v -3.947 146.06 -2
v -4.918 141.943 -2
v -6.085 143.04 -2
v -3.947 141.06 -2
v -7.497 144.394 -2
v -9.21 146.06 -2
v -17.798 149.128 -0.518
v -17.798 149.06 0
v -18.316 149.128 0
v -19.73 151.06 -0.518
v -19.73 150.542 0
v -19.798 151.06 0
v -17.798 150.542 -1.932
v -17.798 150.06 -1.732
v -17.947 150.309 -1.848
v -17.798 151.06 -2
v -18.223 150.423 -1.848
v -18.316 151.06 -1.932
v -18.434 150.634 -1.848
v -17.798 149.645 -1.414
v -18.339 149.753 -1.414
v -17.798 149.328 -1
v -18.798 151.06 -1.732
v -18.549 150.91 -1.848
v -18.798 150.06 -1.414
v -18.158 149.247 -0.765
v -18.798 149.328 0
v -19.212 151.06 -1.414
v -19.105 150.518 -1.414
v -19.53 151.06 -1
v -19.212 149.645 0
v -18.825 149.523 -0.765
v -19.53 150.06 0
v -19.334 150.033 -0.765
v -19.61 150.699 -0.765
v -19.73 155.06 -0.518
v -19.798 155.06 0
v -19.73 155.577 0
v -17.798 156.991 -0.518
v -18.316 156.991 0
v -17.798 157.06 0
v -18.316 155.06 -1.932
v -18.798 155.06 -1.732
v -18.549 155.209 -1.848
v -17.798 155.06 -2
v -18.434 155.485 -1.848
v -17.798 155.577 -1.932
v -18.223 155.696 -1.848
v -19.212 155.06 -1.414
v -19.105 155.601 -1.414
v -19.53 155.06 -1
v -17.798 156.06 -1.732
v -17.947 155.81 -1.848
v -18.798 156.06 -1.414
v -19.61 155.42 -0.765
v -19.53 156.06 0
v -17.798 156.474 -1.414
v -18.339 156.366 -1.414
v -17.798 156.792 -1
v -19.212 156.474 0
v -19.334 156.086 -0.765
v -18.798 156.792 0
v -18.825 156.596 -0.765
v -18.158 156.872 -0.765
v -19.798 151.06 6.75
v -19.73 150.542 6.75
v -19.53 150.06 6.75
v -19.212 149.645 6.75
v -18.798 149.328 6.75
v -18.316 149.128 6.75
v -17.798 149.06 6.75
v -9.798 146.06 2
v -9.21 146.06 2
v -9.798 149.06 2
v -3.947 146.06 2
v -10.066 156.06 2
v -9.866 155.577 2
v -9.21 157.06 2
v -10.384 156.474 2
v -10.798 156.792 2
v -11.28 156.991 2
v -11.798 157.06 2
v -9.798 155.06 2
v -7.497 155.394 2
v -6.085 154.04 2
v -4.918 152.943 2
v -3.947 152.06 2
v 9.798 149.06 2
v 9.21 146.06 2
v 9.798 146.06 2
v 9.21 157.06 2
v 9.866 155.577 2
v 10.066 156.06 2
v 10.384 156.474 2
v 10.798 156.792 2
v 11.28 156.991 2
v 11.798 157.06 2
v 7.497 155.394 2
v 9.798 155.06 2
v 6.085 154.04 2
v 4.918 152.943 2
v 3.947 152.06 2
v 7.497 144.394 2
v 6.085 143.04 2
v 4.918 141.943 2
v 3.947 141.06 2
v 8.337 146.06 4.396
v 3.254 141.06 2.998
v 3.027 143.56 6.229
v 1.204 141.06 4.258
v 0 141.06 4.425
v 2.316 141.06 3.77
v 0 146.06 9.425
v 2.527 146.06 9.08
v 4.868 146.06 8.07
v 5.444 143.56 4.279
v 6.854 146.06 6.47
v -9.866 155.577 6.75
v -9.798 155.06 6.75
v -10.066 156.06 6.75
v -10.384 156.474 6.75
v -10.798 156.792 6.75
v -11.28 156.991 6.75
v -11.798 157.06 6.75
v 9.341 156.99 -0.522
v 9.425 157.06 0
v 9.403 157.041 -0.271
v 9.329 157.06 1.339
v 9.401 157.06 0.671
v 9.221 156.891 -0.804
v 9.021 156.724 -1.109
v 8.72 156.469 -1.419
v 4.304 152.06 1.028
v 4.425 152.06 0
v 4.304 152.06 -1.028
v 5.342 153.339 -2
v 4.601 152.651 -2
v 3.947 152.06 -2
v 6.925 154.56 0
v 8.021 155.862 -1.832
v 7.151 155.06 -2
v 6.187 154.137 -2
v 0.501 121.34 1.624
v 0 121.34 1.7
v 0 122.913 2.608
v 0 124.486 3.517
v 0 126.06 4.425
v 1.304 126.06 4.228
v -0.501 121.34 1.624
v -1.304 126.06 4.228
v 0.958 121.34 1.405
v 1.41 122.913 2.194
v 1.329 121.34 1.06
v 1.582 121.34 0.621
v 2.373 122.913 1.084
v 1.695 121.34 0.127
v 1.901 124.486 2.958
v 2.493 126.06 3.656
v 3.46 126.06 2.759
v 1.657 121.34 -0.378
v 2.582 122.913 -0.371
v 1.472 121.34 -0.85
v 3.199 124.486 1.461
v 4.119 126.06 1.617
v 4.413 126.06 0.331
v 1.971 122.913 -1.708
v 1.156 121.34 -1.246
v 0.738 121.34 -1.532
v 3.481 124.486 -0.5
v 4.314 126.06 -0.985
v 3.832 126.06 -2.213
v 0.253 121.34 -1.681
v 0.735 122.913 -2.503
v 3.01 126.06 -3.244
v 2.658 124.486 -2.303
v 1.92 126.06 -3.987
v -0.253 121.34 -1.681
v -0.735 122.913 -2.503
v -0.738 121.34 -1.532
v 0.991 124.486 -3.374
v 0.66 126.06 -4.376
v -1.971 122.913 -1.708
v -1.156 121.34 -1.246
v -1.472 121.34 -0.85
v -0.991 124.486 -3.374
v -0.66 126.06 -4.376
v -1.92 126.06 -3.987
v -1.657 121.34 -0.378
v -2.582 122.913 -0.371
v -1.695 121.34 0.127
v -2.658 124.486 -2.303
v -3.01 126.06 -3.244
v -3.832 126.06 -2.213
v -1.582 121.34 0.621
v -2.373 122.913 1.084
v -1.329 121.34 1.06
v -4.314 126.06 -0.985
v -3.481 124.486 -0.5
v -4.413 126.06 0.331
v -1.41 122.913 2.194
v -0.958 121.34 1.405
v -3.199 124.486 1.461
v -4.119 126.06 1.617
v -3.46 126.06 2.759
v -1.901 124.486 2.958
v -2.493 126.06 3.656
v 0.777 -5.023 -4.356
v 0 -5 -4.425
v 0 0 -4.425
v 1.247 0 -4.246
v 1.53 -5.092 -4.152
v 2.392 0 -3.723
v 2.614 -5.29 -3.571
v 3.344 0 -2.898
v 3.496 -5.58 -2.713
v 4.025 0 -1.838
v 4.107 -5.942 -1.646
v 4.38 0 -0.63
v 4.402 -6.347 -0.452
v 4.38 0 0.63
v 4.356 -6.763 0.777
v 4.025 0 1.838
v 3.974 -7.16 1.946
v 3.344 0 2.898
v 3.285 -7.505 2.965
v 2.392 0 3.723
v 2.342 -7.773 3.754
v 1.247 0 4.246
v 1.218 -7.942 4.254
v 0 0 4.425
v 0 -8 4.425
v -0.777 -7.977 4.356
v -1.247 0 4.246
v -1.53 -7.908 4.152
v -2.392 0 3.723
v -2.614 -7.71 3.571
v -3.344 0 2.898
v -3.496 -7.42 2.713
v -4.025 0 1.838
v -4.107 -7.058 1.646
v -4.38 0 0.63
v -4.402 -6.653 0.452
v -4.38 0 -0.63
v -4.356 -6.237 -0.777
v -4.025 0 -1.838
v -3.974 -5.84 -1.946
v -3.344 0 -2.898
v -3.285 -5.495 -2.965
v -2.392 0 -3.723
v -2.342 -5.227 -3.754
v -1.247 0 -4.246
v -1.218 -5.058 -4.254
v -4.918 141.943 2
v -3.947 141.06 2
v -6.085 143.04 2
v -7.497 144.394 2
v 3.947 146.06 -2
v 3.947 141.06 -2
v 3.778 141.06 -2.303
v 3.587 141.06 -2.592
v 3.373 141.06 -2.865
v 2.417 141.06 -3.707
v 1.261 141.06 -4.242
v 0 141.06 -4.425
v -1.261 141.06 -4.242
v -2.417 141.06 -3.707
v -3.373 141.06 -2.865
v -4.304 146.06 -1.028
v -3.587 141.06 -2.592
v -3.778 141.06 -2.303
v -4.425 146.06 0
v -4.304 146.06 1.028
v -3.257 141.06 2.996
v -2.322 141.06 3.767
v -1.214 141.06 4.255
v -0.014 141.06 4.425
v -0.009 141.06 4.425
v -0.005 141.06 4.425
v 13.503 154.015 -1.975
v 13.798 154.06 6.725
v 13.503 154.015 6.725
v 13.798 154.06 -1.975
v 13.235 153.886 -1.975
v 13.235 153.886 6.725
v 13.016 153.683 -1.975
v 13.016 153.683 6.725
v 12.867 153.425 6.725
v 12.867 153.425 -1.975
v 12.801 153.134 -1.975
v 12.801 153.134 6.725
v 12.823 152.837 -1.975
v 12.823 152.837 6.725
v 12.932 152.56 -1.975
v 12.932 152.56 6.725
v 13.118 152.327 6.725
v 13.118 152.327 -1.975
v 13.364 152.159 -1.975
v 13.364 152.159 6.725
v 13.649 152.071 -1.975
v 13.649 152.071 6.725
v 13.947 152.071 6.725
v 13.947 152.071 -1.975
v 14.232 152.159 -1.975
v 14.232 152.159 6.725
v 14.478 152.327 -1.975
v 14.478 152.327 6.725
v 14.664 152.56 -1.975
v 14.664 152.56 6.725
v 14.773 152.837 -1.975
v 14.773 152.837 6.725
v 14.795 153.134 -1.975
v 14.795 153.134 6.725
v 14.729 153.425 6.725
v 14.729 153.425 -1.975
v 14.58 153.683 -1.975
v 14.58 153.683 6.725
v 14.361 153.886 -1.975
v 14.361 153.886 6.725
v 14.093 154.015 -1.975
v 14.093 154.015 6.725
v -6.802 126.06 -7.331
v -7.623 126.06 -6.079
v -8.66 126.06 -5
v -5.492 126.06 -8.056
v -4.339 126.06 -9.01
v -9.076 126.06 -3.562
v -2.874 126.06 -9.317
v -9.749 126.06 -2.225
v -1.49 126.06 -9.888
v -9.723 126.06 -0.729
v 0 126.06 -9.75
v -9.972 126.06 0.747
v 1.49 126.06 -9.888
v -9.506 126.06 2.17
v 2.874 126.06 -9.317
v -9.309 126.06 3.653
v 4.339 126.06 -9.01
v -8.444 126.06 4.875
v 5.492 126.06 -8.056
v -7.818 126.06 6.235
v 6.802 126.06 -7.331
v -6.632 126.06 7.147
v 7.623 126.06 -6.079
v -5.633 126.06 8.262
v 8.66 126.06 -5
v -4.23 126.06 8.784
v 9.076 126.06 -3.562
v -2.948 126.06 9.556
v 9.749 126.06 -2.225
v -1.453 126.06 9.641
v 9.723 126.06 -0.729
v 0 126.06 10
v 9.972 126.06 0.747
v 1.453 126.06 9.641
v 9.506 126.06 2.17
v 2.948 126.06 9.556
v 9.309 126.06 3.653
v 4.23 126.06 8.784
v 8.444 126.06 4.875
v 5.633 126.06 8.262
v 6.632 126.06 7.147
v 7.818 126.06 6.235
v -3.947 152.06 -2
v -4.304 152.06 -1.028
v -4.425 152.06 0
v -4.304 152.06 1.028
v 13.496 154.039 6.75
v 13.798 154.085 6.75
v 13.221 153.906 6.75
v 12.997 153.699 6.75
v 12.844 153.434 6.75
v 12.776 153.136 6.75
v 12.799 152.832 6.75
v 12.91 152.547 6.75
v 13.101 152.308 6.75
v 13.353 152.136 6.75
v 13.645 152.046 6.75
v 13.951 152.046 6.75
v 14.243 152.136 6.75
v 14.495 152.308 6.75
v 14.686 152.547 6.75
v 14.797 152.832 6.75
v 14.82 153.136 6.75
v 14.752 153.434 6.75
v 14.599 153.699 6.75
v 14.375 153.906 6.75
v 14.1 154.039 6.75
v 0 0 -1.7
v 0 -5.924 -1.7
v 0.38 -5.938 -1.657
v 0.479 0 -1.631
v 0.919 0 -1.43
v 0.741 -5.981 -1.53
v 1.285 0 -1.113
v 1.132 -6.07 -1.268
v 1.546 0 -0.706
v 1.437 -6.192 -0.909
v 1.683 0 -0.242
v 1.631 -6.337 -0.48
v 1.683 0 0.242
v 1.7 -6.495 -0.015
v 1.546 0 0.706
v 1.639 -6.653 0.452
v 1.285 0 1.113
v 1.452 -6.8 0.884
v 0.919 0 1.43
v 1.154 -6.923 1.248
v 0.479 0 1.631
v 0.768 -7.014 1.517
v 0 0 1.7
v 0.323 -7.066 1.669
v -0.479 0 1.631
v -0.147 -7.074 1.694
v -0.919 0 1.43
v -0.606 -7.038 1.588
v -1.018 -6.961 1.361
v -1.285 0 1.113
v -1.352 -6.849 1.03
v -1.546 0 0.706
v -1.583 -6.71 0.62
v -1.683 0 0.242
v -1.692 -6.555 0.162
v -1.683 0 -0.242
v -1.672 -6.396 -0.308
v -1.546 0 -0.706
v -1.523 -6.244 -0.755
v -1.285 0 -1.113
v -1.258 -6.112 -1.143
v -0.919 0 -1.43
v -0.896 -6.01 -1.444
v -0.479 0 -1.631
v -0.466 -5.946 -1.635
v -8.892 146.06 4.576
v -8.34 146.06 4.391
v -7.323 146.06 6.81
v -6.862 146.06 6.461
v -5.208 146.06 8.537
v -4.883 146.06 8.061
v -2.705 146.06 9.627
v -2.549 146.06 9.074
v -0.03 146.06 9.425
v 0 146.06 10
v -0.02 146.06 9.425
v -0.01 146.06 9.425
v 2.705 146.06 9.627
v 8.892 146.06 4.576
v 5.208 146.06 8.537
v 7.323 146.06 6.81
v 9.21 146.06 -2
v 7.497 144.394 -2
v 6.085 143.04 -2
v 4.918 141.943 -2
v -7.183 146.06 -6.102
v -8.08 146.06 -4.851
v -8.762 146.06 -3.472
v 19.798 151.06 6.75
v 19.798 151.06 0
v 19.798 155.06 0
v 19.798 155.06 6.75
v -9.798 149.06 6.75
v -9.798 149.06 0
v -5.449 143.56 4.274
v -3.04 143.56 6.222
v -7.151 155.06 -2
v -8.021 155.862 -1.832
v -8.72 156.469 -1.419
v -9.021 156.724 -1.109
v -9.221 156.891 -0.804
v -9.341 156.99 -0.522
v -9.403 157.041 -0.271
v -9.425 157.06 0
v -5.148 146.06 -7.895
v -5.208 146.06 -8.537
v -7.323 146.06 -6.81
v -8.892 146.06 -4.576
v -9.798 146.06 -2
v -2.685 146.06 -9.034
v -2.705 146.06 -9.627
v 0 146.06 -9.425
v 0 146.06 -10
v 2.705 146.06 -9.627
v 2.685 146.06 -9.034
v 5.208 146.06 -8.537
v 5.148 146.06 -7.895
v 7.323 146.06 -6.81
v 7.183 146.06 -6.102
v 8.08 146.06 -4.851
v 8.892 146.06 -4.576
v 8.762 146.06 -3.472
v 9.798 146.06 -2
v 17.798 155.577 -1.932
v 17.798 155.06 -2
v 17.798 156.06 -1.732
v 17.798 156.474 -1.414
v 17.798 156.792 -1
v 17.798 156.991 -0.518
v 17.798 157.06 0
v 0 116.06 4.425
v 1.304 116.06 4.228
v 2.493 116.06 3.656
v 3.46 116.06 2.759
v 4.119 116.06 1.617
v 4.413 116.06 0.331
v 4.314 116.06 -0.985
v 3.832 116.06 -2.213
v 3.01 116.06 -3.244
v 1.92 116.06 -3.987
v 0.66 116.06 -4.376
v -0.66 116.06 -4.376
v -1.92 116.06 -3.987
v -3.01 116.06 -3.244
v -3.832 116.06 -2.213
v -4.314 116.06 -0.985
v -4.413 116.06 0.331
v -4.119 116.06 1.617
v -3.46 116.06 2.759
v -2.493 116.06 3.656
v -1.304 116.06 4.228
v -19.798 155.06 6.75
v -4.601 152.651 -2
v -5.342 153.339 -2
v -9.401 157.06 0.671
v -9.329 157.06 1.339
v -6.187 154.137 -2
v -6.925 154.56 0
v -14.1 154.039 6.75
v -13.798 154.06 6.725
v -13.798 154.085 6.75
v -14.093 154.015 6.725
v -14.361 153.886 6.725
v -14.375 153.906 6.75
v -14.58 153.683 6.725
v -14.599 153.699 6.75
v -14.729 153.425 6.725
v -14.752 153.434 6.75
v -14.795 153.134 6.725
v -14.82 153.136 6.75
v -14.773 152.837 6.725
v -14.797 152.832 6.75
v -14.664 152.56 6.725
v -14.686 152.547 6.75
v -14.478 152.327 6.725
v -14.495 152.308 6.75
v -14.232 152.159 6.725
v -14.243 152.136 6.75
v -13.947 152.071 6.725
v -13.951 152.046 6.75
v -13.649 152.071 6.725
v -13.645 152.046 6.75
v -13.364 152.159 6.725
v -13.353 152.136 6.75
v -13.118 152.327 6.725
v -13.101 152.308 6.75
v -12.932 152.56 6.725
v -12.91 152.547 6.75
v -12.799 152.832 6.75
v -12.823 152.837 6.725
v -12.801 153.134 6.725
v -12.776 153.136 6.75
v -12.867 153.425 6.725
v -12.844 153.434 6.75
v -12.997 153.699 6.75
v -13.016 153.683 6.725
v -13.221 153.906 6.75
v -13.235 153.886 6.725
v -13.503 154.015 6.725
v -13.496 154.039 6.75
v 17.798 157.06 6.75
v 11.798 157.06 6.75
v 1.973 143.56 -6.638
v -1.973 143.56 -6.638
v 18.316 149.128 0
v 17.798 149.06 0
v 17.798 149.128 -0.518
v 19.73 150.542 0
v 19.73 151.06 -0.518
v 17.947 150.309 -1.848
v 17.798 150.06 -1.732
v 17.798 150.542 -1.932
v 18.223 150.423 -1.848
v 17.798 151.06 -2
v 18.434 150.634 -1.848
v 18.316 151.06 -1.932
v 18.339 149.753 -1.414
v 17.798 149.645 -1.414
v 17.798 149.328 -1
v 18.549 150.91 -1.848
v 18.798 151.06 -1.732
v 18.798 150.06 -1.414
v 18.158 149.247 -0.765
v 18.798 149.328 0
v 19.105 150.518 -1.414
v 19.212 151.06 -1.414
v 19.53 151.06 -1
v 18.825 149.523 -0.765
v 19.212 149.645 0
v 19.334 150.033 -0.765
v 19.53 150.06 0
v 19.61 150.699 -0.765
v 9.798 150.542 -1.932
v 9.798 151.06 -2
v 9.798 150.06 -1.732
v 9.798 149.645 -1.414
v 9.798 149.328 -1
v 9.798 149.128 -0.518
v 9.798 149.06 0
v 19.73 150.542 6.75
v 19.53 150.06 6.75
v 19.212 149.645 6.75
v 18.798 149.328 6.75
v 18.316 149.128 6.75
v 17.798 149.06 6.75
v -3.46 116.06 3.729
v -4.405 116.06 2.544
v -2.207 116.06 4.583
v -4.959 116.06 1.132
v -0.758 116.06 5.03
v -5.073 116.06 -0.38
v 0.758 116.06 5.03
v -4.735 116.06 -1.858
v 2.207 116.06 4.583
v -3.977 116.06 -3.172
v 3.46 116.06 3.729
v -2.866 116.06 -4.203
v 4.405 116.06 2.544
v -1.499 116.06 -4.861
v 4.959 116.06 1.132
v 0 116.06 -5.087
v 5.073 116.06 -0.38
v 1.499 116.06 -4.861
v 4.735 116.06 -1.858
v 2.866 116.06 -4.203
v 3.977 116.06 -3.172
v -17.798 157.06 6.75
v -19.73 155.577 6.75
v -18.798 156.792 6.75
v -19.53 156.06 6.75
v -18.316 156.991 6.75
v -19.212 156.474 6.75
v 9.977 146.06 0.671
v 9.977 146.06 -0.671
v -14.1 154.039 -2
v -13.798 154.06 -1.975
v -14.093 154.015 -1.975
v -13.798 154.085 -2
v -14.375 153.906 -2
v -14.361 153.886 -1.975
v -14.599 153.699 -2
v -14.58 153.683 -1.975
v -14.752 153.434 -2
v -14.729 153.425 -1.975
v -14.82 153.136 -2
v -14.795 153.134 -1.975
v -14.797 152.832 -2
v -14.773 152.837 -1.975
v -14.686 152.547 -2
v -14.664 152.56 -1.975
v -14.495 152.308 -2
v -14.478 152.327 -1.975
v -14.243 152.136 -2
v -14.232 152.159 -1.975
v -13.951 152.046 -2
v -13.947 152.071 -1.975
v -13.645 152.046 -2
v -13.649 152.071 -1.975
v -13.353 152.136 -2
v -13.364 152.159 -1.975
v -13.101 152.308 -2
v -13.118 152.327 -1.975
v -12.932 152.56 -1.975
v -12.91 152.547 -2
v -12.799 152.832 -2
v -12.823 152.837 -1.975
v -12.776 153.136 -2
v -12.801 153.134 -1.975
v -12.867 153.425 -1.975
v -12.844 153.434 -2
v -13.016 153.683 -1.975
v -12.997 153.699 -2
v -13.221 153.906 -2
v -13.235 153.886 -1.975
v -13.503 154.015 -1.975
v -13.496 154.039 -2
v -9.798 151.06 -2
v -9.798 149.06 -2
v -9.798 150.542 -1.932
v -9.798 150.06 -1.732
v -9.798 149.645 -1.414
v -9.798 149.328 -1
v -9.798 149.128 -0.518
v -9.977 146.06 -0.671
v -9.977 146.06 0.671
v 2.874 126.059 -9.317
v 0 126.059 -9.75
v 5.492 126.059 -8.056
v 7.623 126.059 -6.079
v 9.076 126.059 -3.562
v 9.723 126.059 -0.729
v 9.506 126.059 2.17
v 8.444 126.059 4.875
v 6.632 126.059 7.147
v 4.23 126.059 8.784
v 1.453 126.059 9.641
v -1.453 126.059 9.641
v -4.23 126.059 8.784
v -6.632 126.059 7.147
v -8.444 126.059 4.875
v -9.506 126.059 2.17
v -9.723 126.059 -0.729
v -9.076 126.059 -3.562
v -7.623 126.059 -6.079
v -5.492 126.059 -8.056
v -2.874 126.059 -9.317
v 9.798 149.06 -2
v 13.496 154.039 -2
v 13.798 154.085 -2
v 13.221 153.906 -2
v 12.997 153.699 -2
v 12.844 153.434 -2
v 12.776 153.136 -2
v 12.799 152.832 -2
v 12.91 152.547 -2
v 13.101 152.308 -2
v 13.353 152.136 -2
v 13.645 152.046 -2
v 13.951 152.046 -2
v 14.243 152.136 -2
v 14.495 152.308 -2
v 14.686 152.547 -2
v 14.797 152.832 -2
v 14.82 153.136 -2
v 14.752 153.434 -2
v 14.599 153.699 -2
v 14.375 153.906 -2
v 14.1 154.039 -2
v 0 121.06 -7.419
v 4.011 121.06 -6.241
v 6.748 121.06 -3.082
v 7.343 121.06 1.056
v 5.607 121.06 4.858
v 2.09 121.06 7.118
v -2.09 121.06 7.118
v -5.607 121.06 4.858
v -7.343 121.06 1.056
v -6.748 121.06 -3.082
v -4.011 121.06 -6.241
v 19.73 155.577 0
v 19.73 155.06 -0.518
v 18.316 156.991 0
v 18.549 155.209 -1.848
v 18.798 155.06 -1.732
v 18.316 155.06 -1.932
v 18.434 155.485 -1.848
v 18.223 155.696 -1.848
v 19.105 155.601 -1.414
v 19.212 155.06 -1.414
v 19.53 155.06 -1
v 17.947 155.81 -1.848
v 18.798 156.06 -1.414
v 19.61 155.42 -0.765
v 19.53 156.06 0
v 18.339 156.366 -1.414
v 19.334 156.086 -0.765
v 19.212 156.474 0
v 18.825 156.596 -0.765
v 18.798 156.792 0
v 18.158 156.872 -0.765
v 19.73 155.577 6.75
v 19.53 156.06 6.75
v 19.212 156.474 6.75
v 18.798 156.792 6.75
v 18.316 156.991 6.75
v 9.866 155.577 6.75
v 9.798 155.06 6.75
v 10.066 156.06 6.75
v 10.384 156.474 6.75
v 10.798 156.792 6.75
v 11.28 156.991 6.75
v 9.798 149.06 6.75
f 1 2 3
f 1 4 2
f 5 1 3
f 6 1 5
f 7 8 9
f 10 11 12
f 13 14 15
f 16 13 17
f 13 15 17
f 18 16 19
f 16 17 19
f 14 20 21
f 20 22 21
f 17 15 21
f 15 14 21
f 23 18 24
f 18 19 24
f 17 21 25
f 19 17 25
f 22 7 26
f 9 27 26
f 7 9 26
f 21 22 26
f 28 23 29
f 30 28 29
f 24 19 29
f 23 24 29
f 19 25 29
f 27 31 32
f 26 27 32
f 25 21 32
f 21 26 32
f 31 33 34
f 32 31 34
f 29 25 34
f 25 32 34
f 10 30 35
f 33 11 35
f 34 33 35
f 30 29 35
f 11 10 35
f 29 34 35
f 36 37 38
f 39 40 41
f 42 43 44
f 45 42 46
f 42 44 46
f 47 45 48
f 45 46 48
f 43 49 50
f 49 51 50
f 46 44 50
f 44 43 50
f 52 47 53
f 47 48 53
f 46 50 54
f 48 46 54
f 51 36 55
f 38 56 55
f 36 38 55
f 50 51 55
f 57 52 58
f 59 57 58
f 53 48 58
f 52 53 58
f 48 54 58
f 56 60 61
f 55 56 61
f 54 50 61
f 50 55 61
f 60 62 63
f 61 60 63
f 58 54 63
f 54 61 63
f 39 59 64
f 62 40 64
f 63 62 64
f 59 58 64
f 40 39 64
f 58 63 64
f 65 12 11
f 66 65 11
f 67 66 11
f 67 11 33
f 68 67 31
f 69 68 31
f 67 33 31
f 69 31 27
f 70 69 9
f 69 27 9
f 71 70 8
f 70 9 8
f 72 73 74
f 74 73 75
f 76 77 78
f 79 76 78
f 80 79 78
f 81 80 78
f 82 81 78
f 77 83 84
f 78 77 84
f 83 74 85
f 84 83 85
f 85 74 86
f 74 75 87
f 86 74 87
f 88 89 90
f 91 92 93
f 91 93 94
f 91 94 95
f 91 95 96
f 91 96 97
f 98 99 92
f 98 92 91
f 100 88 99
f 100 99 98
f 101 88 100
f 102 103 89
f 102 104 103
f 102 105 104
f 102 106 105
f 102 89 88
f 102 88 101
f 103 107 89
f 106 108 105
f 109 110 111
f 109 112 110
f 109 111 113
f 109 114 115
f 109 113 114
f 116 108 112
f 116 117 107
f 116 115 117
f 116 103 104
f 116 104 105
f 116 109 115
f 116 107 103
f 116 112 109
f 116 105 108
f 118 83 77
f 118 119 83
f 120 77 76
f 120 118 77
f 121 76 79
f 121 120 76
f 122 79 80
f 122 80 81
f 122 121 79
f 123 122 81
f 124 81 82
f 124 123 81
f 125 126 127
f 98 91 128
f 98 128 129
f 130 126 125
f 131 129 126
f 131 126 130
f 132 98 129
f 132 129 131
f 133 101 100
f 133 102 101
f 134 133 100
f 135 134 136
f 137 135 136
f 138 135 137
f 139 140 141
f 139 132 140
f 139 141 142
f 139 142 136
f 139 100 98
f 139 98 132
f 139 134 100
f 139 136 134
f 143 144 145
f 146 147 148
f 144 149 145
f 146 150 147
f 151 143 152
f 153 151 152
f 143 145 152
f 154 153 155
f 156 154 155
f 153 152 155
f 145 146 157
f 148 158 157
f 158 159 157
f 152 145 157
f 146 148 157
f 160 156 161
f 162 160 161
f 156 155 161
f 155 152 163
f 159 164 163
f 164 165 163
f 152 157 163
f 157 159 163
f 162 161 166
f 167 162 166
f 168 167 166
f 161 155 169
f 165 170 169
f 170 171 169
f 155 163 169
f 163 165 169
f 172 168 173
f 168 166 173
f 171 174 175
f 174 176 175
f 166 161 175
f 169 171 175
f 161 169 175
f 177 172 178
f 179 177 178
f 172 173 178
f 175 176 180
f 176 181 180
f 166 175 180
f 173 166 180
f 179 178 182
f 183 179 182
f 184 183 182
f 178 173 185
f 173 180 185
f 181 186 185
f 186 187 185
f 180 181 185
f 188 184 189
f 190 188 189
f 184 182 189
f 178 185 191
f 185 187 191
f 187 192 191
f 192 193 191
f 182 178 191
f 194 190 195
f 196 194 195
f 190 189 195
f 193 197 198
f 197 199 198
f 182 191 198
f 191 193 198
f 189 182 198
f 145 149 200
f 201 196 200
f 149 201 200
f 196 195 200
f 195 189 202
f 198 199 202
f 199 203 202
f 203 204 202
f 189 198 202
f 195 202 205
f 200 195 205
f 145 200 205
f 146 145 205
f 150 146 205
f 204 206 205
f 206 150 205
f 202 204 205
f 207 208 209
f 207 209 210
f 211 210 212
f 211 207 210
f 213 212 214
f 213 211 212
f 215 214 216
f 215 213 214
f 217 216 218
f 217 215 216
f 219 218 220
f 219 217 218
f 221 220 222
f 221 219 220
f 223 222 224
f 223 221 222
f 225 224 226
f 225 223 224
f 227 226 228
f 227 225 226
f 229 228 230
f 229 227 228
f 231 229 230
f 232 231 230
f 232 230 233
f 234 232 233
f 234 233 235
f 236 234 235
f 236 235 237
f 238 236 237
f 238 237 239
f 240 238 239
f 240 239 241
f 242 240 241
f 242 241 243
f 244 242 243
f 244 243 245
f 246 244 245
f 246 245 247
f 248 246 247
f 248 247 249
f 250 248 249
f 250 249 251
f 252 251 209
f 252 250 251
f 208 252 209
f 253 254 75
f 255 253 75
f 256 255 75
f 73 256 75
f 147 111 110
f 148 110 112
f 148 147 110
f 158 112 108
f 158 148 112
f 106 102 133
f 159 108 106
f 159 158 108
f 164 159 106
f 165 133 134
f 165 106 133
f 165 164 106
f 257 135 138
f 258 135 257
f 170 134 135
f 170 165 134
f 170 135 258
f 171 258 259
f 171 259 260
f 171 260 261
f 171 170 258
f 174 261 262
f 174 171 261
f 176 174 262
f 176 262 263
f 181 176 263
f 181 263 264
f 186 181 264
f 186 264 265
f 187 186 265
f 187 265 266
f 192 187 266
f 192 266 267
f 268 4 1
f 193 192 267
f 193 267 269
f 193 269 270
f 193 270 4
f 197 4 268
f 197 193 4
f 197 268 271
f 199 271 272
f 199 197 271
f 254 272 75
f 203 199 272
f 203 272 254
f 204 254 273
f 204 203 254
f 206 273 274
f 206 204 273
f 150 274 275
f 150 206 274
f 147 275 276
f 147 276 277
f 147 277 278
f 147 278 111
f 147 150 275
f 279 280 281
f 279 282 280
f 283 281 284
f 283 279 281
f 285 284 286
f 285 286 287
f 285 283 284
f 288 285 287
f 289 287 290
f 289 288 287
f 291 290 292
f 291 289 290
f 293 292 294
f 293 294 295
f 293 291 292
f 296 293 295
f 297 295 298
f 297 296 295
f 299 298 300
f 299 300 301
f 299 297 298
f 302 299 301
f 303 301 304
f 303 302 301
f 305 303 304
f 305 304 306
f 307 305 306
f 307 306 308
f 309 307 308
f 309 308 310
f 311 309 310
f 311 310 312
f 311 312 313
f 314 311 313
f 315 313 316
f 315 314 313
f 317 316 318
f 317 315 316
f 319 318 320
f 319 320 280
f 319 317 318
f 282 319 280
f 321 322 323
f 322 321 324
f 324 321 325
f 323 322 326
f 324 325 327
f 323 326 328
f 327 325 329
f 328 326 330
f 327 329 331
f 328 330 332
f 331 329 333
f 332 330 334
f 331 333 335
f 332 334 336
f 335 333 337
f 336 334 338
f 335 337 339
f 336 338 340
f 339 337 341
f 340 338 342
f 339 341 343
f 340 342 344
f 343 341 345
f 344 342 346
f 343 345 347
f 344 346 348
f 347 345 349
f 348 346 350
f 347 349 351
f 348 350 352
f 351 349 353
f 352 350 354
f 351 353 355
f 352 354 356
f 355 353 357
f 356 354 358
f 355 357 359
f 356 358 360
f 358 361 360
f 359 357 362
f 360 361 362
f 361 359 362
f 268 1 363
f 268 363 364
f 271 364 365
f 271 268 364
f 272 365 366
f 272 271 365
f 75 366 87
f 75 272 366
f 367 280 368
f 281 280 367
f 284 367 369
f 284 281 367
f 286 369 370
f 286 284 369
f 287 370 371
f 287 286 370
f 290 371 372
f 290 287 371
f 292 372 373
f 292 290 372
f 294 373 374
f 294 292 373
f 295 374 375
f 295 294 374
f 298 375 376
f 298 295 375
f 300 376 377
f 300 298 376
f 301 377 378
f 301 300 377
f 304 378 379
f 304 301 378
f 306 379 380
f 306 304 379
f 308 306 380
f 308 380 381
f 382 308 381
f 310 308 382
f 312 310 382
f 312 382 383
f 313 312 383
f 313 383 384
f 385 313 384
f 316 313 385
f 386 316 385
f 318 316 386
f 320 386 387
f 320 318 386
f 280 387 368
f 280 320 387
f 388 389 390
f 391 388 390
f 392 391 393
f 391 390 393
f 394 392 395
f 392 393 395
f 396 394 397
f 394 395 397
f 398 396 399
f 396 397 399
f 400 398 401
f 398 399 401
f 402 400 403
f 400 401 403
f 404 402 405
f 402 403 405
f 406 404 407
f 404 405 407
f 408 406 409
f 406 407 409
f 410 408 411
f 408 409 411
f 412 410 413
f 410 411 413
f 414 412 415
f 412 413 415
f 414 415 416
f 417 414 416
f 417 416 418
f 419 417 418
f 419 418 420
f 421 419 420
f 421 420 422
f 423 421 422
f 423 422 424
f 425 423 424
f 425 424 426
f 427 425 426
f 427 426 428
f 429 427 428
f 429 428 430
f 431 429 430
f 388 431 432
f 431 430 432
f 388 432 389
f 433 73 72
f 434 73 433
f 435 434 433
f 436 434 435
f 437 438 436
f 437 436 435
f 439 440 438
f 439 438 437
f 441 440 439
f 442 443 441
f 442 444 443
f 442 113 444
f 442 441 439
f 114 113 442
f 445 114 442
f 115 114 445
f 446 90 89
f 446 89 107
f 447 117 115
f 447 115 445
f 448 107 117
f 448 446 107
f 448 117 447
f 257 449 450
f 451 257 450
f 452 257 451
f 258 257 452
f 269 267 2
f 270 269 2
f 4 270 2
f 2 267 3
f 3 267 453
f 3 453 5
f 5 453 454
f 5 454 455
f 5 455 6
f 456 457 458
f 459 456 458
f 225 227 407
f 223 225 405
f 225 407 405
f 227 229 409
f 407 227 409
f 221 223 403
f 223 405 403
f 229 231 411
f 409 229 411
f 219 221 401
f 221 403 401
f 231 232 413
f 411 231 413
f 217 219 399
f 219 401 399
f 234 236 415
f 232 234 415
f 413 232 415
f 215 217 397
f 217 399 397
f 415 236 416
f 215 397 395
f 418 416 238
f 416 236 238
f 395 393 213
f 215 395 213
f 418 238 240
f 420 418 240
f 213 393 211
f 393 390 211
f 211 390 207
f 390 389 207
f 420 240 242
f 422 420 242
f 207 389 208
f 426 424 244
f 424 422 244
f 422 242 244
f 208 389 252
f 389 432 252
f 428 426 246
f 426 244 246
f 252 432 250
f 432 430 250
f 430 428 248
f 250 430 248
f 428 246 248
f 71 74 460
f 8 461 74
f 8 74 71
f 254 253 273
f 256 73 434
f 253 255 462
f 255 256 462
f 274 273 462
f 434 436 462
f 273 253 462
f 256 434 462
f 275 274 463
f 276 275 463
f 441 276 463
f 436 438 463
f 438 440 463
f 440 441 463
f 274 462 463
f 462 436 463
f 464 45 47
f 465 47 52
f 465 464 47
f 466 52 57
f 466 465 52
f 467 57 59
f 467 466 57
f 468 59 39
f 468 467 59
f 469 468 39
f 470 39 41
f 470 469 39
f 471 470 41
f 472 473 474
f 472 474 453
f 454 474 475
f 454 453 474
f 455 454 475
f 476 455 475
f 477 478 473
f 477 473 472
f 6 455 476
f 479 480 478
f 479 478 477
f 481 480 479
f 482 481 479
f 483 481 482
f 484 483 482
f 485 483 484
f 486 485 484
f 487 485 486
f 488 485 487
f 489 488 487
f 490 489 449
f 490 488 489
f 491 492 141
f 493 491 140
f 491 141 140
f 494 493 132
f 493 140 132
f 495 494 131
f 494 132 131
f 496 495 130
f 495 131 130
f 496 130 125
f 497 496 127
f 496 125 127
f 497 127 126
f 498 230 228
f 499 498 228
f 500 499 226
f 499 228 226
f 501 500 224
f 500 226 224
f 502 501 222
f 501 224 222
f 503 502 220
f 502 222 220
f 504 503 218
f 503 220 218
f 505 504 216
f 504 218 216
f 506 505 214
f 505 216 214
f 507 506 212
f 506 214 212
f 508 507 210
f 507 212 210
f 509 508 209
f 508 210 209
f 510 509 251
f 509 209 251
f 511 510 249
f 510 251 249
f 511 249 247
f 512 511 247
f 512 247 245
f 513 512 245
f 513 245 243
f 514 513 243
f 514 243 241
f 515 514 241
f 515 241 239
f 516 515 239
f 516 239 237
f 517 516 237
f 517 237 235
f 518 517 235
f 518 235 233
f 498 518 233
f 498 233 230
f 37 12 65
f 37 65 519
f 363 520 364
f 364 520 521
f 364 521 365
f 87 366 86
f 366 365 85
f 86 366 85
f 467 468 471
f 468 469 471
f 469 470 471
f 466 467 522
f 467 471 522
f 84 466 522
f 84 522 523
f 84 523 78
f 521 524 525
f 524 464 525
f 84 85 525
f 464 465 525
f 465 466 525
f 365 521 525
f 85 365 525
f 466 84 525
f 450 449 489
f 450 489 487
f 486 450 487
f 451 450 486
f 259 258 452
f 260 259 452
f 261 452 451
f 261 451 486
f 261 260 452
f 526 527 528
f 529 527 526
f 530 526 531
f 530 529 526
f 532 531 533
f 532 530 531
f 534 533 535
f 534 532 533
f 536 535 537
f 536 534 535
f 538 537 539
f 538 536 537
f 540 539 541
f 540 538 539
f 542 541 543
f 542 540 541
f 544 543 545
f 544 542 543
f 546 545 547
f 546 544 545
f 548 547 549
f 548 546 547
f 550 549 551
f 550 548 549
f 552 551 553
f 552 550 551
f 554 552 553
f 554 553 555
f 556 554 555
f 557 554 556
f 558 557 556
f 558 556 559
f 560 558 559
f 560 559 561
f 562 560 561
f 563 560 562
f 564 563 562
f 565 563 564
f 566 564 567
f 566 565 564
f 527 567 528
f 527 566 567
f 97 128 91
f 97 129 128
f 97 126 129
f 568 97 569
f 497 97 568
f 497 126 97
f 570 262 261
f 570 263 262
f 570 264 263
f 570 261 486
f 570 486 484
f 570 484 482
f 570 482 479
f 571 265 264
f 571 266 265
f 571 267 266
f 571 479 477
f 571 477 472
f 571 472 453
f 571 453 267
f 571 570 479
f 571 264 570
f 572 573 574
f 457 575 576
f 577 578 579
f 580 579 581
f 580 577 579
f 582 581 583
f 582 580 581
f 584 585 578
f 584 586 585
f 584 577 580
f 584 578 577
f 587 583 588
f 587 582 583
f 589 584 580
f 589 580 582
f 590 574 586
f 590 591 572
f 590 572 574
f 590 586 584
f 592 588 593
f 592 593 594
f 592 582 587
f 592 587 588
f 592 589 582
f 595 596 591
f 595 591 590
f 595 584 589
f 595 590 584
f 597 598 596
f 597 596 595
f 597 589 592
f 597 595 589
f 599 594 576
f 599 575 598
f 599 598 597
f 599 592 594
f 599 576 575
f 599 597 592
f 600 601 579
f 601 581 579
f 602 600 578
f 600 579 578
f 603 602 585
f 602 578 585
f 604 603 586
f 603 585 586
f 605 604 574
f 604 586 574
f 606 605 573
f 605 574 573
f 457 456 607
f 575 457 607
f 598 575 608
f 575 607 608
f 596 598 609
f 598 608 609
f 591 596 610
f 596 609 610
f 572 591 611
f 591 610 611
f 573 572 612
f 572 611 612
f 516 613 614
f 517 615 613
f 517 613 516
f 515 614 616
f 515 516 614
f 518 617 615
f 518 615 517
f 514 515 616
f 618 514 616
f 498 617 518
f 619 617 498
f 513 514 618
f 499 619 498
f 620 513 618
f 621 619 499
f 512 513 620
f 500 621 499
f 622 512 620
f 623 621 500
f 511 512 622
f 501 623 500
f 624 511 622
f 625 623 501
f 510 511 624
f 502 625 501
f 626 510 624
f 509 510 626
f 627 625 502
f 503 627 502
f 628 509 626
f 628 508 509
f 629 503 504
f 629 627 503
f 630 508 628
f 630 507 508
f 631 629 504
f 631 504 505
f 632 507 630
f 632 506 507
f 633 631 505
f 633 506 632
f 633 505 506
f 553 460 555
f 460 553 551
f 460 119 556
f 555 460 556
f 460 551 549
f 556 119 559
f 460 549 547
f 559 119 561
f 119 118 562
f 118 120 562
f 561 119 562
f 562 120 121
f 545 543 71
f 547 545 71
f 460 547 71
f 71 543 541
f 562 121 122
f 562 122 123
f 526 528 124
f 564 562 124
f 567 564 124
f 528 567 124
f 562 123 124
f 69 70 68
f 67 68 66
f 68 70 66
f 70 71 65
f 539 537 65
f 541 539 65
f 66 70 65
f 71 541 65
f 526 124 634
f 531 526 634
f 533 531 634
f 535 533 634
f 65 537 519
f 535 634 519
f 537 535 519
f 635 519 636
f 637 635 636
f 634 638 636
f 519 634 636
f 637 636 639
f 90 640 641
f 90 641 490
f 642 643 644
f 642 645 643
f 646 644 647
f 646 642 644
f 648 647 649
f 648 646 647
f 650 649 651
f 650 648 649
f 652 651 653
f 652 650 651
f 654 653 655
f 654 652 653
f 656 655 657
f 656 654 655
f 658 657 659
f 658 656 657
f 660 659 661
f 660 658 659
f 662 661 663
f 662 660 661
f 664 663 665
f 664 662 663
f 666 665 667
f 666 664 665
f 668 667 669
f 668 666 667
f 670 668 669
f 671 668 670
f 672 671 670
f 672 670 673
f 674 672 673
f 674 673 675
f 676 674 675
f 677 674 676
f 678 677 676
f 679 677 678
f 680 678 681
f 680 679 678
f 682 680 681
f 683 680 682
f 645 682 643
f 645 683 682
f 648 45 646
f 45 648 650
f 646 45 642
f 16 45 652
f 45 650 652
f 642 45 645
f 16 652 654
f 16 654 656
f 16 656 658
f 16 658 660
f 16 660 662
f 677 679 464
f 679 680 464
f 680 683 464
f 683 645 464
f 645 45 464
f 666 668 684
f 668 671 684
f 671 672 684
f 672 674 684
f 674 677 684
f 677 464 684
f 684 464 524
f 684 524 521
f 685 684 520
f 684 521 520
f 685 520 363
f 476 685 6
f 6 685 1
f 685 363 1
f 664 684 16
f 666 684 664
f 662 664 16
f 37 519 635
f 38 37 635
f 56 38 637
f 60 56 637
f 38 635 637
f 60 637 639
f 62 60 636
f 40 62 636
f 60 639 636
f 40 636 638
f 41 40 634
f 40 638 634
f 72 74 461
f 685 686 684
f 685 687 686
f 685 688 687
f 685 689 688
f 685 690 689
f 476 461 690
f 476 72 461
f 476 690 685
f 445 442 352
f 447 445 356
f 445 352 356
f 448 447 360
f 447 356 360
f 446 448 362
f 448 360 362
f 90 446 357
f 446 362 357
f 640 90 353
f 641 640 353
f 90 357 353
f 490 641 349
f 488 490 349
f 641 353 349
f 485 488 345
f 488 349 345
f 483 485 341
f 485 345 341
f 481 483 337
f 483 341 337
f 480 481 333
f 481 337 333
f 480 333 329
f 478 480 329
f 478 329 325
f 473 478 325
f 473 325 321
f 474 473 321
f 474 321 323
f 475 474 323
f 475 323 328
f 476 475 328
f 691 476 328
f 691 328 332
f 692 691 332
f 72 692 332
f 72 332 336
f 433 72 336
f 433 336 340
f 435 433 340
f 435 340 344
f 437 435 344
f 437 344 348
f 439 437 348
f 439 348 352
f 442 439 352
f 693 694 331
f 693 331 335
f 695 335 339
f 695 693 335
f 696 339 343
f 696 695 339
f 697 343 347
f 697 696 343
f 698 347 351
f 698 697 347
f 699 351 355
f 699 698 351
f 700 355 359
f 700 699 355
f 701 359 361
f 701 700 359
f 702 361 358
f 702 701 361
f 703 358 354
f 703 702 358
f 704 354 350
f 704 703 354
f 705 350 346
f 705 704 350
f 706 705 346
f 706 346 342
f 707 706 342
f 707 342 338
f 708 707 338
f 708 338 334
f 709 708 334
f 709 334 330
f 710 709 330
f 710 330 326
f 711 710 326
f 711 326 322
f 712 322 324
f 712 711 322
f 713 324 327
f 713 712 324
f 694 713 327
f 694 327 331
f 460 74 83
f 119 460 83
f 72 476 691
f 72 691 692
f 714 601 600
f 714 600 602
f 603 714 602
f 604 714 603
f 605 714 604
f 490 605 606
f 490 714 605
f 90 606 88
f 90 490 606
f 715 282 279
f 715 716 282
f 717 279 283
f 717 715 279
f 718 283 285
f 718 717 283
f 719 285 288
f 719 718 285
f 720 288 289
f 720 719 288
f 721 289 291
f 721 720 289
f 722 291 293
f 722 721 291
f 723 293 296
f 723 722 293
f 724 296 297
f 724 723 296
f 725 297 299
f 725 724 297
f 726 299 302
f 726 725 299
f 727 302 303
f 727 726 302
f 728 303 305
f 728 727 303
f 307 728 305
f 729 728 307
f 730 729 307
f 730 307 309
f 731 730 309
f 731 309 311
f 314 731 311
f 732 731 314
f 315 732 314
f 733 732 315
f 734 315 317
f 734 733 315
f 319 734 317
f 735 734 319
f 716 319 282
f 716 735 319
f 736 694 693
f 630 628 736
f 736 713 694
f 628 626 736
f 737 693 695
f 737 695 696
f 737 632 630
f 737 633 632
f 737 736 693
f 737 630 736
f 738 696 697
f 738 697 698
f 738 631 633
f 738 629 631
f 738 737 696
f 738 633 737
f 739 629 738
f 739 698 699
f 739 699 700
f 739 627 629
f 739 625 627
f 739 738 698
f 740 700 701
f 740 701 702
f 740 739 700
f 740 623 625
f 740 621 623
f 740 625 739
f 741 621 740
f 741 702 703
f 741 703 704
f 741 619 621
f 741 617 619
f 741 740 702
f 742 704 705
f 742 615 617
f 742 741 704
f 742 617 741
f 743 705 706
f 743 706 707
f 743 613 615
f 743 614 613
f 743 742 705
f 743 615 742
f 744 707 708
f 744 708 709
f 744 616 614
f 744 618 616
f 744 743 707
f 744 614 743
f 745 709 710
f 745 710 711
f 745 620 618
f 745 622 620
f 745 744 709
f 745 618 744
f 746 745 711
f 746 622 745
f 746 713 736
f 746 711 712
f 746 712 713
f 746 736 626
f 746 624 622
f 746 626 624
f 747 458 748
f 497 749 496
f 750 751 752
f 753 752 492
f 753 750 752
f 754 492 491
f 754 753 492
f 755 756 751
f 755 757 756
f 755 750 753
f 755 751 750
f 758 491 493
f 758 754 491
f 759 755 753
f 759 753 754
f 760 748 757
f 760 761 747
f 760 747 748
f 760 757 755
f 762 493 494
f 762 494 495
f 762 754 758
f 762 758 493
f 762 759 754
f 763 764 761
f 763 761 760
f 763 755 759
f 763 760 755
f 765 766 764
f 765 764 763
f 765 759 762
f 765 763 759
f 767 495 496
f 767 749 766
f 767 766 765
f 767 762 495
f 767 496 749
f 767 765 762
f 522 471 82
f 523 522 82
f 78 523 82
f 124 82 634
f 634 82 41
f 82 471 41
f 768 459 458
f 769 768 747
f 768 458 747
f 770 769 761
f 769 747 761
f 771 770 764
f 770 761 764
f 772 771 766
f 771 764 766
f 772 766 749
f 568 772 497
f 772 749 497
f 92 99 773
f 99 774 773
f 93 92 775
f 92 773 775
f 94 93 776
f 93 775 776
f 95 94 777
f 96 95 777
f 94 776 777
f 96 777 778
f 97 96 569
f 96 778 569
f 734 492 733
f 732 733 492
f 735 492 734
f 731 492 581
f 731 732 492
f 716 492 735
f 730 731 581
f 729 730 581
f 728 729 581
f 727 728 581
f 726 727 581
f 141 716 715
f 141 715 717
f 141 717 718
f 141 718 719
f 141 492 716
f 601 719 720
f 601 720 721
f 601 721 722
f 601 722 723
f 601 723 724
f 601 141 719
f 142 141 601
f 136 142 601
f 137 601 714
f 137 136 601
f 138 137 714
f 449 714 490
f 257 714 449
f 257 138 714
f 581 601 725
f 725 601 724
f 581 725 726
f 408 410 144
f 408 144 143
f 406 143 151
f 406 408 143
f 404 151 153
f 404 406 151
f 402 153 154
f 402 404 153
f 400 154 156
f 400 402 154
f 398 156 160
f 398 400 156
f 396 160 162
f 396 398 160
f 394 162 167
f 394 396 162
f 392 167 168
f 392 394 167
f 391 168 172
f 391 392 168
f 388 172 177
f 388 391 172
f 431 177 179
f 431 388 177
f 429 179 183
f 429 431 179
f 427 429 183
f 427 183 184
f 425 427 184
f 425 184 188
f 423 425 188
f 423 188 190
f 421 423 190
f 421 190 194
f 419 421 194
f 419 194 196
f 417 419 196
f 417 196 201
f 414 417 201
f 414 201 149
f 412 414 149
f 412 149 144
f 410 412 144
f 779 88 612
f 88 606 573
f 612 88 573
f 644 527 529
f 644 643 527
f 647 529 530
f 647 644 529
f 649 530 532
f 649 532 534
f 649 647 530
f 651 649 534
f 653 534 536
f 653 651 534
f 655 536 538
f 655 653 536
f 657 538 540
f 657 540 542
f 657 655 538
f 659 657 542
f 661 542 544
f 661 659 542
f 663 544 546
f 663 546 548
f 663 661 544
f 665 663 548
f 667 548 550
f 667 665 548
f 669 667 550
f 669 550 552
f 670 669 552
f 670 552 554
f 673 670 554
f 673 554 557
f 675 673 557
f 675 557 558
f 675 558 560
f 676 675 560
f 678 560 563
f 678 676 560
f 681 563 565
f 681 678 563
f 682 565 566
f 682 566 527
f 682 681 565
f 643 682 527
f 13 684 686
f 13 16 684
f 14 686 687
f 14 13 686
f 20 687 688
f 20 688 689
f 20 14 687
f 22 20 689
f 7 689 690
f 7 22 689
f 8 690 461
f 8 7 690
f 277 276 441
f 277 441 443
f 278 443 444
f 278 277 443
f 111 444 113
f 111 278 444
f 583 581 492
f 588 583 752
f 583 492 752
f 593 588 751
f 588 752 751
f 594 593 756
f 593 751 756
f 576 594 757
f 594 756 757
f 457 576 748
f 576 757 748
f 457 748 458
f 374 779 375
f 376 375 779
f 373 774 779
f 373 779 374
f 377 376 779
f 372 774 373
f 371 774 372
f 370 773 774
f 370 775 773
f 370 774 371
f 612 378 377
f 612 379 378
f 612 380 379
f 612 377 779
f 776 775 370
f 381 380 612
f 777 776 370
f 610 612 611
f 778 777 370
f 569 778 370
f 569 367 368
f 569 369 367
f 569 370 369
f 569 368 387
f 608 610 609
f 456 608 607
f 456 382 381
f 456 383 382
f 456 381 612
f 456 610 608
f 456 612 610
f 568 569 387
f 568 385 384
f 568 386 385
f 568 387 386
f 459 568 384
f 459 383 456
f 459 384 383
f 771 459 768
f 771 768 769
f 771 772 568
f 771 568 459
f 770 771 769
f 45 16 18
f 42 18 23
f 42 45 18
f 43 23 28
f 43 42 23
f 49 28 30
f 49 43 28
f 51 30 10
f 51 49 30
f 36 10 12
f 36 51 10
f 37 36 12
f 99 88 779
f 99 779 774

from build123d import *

# Parameters (mm, degrees)
SKETCH1_R                      = 4.425000000000001
SKETCH1_R_2                    = 1.7
BOSS_EXTRUDE1_DEPTH            = 130
CHAMFER1_SIZE                  = 8.660254038
CHAMFER1_SIZE_2                = 5
SKETCH2_R                      = 10
SKETCH2_R_2                    = 4.425000000000001
BOSS_EXTRUDE2_DEPTH            = 20
BOSS_EXTRUDE5_DEPTH            = 11
BOSS_EXTRUDE6_DEPTH            = 10
SKETCH13_W                     = 10.000000000000002
SKETCH13_H                     = 8
BOSS_EXTRUDE7_DEPTH            = 4.75
FILLET1_R                      = 2
FILLET1_OF_MIRROR1_R           = 2
CHAMFER4_SIZE                  = 5
CHAMFER2_SIZE                  = 5
BOSS_EXTRUDE3_START            = 10
SKETCH7_R                      = 9.75
SKETCH7_R_2                    = 4.425000000000001
BOSS_EXTRUDE3_DEPTH            = 10
CHAMFER3_SIZE2                 = 4.663076582
CHAMFER3_SIZE                  = 10
BOSS_EXTRUDE4_START            = 8
SKETCH8_R                      = 4.425000000000001
SKETCH8_R_2                    = 1.7
BOSS_EXTRUDE4_DEPTH            = 8
CUT_EXTRUDE1_DEPTH             = 8
CUT_EXTRUDE1_DEPTH_BACK        = 8
FILLET2_R                      = 2
F_2_0MM_DOWEL_HOLE1_AT_2_COUNT = 2
F_2_0MM_DOWEL_HOLE1_AT_2_PITCH = 27.595917942265427


# Some blends are built 0.0001 mm under size
with BuildPart() as part:
    # Sketch1 → Boss-Extrude1 (new body)
    with BuildSketch(Plane(origin=(0, 0, 0), x_dir=(1, 0, 0), z_dir=(0, 1, 0))):
        with Locations(Location((0, 0, 0), (0, 0, 270))):
            Circle(SKETCH1_R)
        with Locations(Location((0, 0, 0), (0, 0, 270))):
            Circle(SKETCH1_R_2, mode=Mode.SUBTRACT)
    extrude(amount=BOSS_EXTRUDE1_DEPTH)

    # Chamfer1
    # the kernel refuses this chamfer: 8.660254038, 5 mm, written as the material it takes off along each edge
    with BuildSketch(Plane(origin=(0, 130, 0), x_dir=(-1.8e-16, 0, 1), z_dir=(-1, 0, -1.8e-16))) as chamfer1_piece_1:
        Polygon((1.7, -CHAMFER1_SIZE), (1.7 + CHAMFER1_SIZE_2, 0), (1.7, 0), align=None)
    revolve(axis=Axis((0, 130, 0), (0, 1, 0)), mode=Mode.SUBTRACT)



with BuildPart() as body_2:
    # Sketch2 → Boss-Extrude2 (new body)
    with BuildSketch(Plane(origin=(0, 126.05958441278065, 0), x_dir=(1, 0, 0), z_dir=(0, 1, 0))):
        with Locations(Location((0, 0, 0), (0, 0, 270))):
            Circle(SKETCH2_R)
        with Locations(Location((0, 0, 0), (0, 0, 270))):
            Circle(SKETCH2_R_2, mode=Mode.SUBTRACT)
    extrude(amount=BOSS_EXTRUDE2_DEPTH)

    # Sketch10 → Boss-Extrude5 (add)
    with BuildSketch(Plane(origin=(0, 146.05958441278062, 0), x_dir=(1, 0, 0), z_dir=(0, 1, 0))):
        with BuildLine():
            Line((-3.9472300414341213, -1.9999999999999991), (-9.797958971132713, -1.9999999999999987))
            Line((-9.797958971132713, -1.9999999999999987), (-9.797958971132713, 1.9999999999999987))
            Line((-9.797958971132713, 1.9999999999999987), (-3.9472300414341213, 2.0000000000000004))
            ThreePointArc((-3.9472300414341213, 2.0000000000000004), (-4.425000000000002, 1.42e-15), (-3.9472300414341213, -1.9999999999999991))
        make_face()
        with BuildLine():
            Line((3.9472300414341213, 2.0000000000000004), (9.797958971132713, 1.9999999999999987))
            Line((9.797958971132713, 1.9999999999999987), (9.797958971132713, -1.9999999999999987))
            Line((9.797958971132713, -1.9999999999999987), (3.9472300414341213, -1.9999999999999991))
            ThreePointArc((3.9472300414341213, -1.9999999999999991), (4.425000000000002, 4.9e-16), (3.9472300414341213, 2.0000000000000004))
        make_face()
    boss_extrude5 = extrude(amount=BOSS_EXTRUDE5_DEPTH)

    # Sketch11 → Boss-Extrude6 (add)
    with BuildSketch(Plane(origin=(9.797958971132713, 0, 0), x_dir=(0, 0, -1), z_dir=(1, 0, 0))):
        Polygon((-2.0000000000000004, 157.05958441278065), (2.0000000000000004, 157.05958441278065), (2.0000000000000013, 149.05958441278065), (-1.9999999999999996, 149.05958441278065), align=None)
    boss_extrude6 = extrude(amount=BOSS_EXTRUDE6_DEPTH)

    # Sketch13 → Boss-Extrude7 (add)
    with BuildSketch(Plane.XY.offset(1.9999999999999996)):
        with Locations((14.797958971132715, 153.05958441278065)):
            Rectangle(SKETCH13_W, SKETCH13_H)
    boss_extrude7 = extrude(amount=BOSS_EXTRUDE7_DEPTH)

    # Fillet1
    fillet1_edges = [body_2.edges().sort_by_distance(p)[0] for p in [
        (19.797958971132715, 149.05958441278065, 2.374999999999999),
        (19.797958971132715, 157.05958441278065, 2.375),
        (9.797958971132713, 157.05958441278065, 4.375),
    ]]
    fillet(fillet1_edges, radius=FILLET1_R)

    # Mirror1: Boss-Extrude5, Boss-Extrude6, Boss-Extrude7 across plane
    add(boss_extrude5.mirror(Plane(origin=(0, 0, 0), x_dir=(0, 0, 1), z_dir=(1, 0, 0))))
    add(boss_extrude6.mirror(Plane(origin=(0, 0, 0), x_dir=(0, 0, 1), z_dir=(1, 0, 0))))
    add(boss_extrude7.mirror(Plane(origin=(0, 0, 0), x_dir=(0, 0, 1), z_dir=(1, 0, 0))))

    # Fillet1 of Mirror1
    fillet1_of_mirror1_edges = [body_2.edges().sort_by_distance(p)[0] for p in [
        (-19.797958971132715, 149.05958441278065, 2.374999999999999),
        (-19.797958971132715, 157.05958441278065, 2.375),
        (-9.797958971132713, 157.05958441278065, 4.375),
    ]]
    fillet(fillet1_of_mirror1_edges, radius=FILLET1_OF_MIRROR1_R)

    # Chamfer4
    chamfer4_edges = [body_2.edges().sort_by_distance(p)[0] for p in [
        (-4.425000000000001, 157.05958441278062, -8.9e-16),
        (4.425000000000001, 157.05958441278062, -4.4e-16),
    ]]
    chamfer(chamfer4_edges, length=CHAMFER4_SIZE)

    # Chamfer2
    # the kernel refuses this chamfer: 5 mm, written as the material it takes off along each edge
    with BuildSketch(Plane(origin=(0, 146.05958441278065, 0), x_dir=(-1.8e-16, 0, 1), z_dir=(-1, 0, -1.8e-16))) as chamfer2_piece_1_section:
        Polygon((4.425000000000001 + CHAMFER2_SIZE, 0), (4.425000000000001, -CHAMFER2_SIZE), (4.425000000000001, 0), align=None)
    chamfer2_piece_1 = revolve(axis=Axis((0, 146.05958441278065, 0), (0, 1, 0)), revolution_arc=229.65559156034735, mode=Mode.PRIVATE)
    chamfer2_piece_1 = split(chamfer2_piece_1, bisect_by=Plane(origin=(3.4962989060628606, 144.5390563337766, 1.9999999999999991), z_dir=(8e-17, 0, 1)), keep=Keep.TOP, mode=Mode.PRIVATE)
    add(chamfer2_piece_1, mode=Mode.SUBTRACT)
    with BuildSketch(Plane(origin=(0, 146.05958441278065, 0), x_dir=(-1.8e-16, 0, 1), z_dir=(-1, 0, -1.8e-16))) as chamfer2_piece_2_section:
        Polygon((4.425000000000001 + CHAMFER2_SIZE, 0), (4.425000000000001, -CHAMFER2_SIZE), (4.425000000000001, 0), align=None)
    chamfer2_piece_2 = revolve(axis=Axis((0, 146.05958441278065, 0), (0, 1, 0)), revolution_arc=229.65559156034735, mode=Mode.PRIVATE)
    chamfer2_piece_2 = split(chamfer2_piece_2, bisect_by=Plane(origin=(0.9948048927279718, 144.5258061794418, -2.0000000000000013), z_dir=(3e-16, 0, -1)), keep=Keep.TOP, mode=Mode.PRIVATE)
    add(chamfer2_piece_2, mode=Mode.SUBTRACT)
    with BuildSketch(Plane(origin=(0, 146.05958441278065, 0), x_dir=(0.00314158748587874, 0, 0.9999950652018582), z_dir=(-0.9999950652018582, 0, 0.00314158748587874))) as chamfer2_piece_3_section:
        Polygon((4.425000000000001, -CHAMFER2_SIZE), (4.425000000000001 + CHAMFER2_SIZE, 0), (4.425000000000001, 0), align=None)
    chamfer2_piece_3 = revolve(axis=Axis((0, 146.05958441278065, 0), (0, 1, 0)), revolution_arc=359.64000000000004, mode=Mode.PRIVATE)
    chamfer2_piece_3 = split(chamfer2_piece_3, bisect_by=Plane(origin=(3.5051865740381585, 144.53913826571085, 1.9999999999999998), z_dir=(-8e-17, 0, 1)), keep=Keep.TOP, mode=Mode.PRIVATE)
    add(chamfer2_piece_3, mode=Mode.SUBTRACT)
    with BuildSketch(Plane(origin=(0, 146.05958441278065, 0), x_dir=(0.00314158748587874, 0, 0.9999950652018582), z_dir=(-0.9999950652018582, 0, 0.00314158748587874))) as chamfer2_piece_4_section:
        Polygon((4.425000000000001, -CHAMFER2_SIZE), (4.425000000000001 + CHAMFER2_SIZE, 0), (4.425000000000001, 0), align=None)
    chamfer2_piece_4 = revolve(axis=Axis((0, 146.05958441278065, 0), (0, 1, 0)), revolution_arc=359.64000000000004, mode=Mode.PRIVATE)
    chamfer2_piece_4 = split(chamfer2_piece_4, bisect_by=Plane(origin=(-1.19549e-12, 144.53905633375842, -2.0000000000000018), z_dir=(-3e-16, 0, -1)), keep=Keep.TOP, mode=Mode.PRIVATE)
    add(chamfer2_piece_4, mode=Mode.SUBTRACT)
    with BuildSketch(Plane(origin=(0, 146.05958441278065, 0), x_dir=(0.762166791053464, 0, -0.6473807091775792), z_dir=(0.6473807091775792, 0, 0.762166791053464))) as chamfer2_piece_5_section:
        Polygon((4.425000000000001 + CHAMFER2_SIZE, 0), (4.425000000000001, -CHAMFER2_SIZE), (4.425000000000001, 0), align=None)
    chamfer2_piece_5 = revolve(axis=Axis((0, 146.05958441278065, 0), (0, 1, 0)), revolution_arc=229.6555915603473, mode=Mode.PRIVATE)
    chamfer2_piece_5 = split(chamfer2_piece_5, bisect_by=Plane(origin=(-0.9948048927279931, 144.52580617944176, -2.0000000000000013), z_dir=(-3e-16, 0, -1)), keep=Keep.TOP, mode=Mode.PRIVATE)
    add(chamfer2_piece_5, mode=Mode.SUBTRACT)
    with BuildSketch(Plane(origin=(0, 146.05958441278065, 0), x_dir=(0.762166791053464, 0, -0.6473807091775792), z_dir=(0.6473807091775792, 0, 0.762166791053464))) as chamfer2_piece_6_section:
        Polygon((4.425000000000001 + CHAMFER2_SIZE, 0), (4.425000000000001, -CHAMFER2_SIZE), (4.425000000000001, 0), align=None)
    chamfer2_piece_6 = revolve(axis=Axis((0, 146.05958441278065, 0), (0, 1, 0)), revolution_arc=229.6555915603473, mode=Mode.PRIVATE)
    chamfer2_piece_6 = split(chamfer2_piece_6, bisect_by=Plane(origin=(-3.496298906062748, 144.53905633377667, 1.9999999999999991), z_dir=(-8e-17, 0, 1)), keep=Keep.TOP, mode=Mode.PRIVATE)
    add(chamfer2_piece_6, mode=Mode.SUBTRACT)


with BuildPart() as part_1:
    add(part.part)

    add(body_2.part)  # Boss-Extrude3 merges body 2
    # Sketch7 → Boss-Extrude3 (add)
    with BuildSketch(Plane.XZ.offset(-126.05958441278065).offset(BOSS_EXTRUDE3_START)):
        with Locations(Location((0, 0, 0), (0, 0, 270))):
            Circle(SKETCH7_R)
        with Locations(Location((0, 0, 0), (0, 0, 270))):
            Circle(SKETCH7_R_2, mode=Mode.SUBTRACT)
    extrude(amount=-BOSS_EXTRUDE3_DEPTH)

    # Chamfer3
    chamfer3_edges = [part_1.edges().sort_by_distance(p)[0] for p in [
        (2.99e-15, 116.05958441278065, 9.75),
    ]]
    chamfer3_side = [part_1.faces().sort_by_distance(p)[0] for p in [
        (2.99e-15, 116.15284594441165, 9.75),
    ]]
    chamfer(chamfer3_edges, length=CHAMFER3_SIZE - 0.0001, length2=CHAMFER3_SIZE2 - 0.0001, reference=chamfer3_side[0])  # a hair under: the kernel refuses the full size

    # Sketch8 → Boss-Extrude4 (add)
    with BuildSketch(Plane.XZ.offset(BOSS_EXTRUDE4_START)):
        with Locations(Location((0, 0, 0), (0, 0, 270))):
            Circle(SKETCH8_R)
        with Locations(Location((0, 0, 0), (0, 0, 270))):
            Circle(SKETCH8_R_2, mode=Mode.SUBTRACT)
    extrude(amount=-BOSS_EXTRUDE4_DEPTH)

    # Sketch9 → Cut-Extrude1 (cut, two sides: drawn at the far end of the back side and taken through both)
    with BuildSketch(Plane(origin=(0, 0, 0), x_dir=(0, 0, -1), z_dir=(1, 0, 0)).offset(-CUT_EXTRUDE1_DEPTH_BACK)):
        Polygon((-4.425000000000001, -8.000000000000007), (4.425000000000001, -5.000000000000007), (4.425000000000001, -8.000000000000007), align=None)
    extrude(amount=CUT_EXTRUDE1_DEPTH + CUT_EXTRUDE1_DEPTH_BACK, mode=Mode.SUBTRACT)

    # Fillet2
    fillet2_edges = [part_1.edges().sort_by_distance(p)[0] for p in [
        (13.797958971132715, 149.05958441278065, -2.0000000000000013),
        (19.21217253350581, 149.64537085040755, -1.9999999999999964),
        (19.797958971132715, 153.05958441278062, -2.000000000000001),
        (19.21217253350581, 156.47379797515373, -1.9999999999999964),
        (-13.797958971132715, 149.05958441278065, -2.0000000000000013),
        (-19.21217253350581, 149.64537085040755, -1.9999999999999964),
        (-19.797958971132715, 153.05958441278062, -2.000000000000001),
        (-19.21217253350581, 156.47379797515373, -1.9999999999999964),
        (13.504156599424196, 157.05958441278062, -2),
        (-13.504156599424196, 157.05958441278065, -2.0000000000000004),
    ]]
    fillet(fillet2_edges, radius=FILLET2_R)

    # Sketch17 → Ø2.0mm Dowel Hole1 (revolve, cut)
    with BuildSketch(Plane(origin=(-13.797958971132712, 153.05958441278065, -1.9999999999999978), x_dir=(0, 1, 0), z_dir=(1, 0, -3e-16))):
        Polygon((0, 0), (-2.14e-15, 8.749999999999998), (1.0249999999999977, 8.749999999999998), (0.9999999999999983, 8.724999999999996), (0.9999999999999993, 0.02500000000000072), (1.025, 0), align=None)
    f_2_0mm_dowel_hole1 = revolve(axis=Axis((-13.797958971132713, 153.05958441278065, -8.349999999999989), (3e-16, 0, 1)), mode=Mode.SUBTRACT)

    # Ø2.0mm Dowel Hole1 at 2: Ø2.0mm Dowel Hole1 ×2
    with Locations(*[(i * F_2_0MM_DOWEL_HOLE1_AT_2_PITCH, 0, 0) for i in range(1, F_2_0MM_DOWEL_HOLE1_AT_2_COUNT)]):
        add(f_2_0mm_dowel_hole1, mode=Mode.SUBTRACT)


solid = part_1.part
